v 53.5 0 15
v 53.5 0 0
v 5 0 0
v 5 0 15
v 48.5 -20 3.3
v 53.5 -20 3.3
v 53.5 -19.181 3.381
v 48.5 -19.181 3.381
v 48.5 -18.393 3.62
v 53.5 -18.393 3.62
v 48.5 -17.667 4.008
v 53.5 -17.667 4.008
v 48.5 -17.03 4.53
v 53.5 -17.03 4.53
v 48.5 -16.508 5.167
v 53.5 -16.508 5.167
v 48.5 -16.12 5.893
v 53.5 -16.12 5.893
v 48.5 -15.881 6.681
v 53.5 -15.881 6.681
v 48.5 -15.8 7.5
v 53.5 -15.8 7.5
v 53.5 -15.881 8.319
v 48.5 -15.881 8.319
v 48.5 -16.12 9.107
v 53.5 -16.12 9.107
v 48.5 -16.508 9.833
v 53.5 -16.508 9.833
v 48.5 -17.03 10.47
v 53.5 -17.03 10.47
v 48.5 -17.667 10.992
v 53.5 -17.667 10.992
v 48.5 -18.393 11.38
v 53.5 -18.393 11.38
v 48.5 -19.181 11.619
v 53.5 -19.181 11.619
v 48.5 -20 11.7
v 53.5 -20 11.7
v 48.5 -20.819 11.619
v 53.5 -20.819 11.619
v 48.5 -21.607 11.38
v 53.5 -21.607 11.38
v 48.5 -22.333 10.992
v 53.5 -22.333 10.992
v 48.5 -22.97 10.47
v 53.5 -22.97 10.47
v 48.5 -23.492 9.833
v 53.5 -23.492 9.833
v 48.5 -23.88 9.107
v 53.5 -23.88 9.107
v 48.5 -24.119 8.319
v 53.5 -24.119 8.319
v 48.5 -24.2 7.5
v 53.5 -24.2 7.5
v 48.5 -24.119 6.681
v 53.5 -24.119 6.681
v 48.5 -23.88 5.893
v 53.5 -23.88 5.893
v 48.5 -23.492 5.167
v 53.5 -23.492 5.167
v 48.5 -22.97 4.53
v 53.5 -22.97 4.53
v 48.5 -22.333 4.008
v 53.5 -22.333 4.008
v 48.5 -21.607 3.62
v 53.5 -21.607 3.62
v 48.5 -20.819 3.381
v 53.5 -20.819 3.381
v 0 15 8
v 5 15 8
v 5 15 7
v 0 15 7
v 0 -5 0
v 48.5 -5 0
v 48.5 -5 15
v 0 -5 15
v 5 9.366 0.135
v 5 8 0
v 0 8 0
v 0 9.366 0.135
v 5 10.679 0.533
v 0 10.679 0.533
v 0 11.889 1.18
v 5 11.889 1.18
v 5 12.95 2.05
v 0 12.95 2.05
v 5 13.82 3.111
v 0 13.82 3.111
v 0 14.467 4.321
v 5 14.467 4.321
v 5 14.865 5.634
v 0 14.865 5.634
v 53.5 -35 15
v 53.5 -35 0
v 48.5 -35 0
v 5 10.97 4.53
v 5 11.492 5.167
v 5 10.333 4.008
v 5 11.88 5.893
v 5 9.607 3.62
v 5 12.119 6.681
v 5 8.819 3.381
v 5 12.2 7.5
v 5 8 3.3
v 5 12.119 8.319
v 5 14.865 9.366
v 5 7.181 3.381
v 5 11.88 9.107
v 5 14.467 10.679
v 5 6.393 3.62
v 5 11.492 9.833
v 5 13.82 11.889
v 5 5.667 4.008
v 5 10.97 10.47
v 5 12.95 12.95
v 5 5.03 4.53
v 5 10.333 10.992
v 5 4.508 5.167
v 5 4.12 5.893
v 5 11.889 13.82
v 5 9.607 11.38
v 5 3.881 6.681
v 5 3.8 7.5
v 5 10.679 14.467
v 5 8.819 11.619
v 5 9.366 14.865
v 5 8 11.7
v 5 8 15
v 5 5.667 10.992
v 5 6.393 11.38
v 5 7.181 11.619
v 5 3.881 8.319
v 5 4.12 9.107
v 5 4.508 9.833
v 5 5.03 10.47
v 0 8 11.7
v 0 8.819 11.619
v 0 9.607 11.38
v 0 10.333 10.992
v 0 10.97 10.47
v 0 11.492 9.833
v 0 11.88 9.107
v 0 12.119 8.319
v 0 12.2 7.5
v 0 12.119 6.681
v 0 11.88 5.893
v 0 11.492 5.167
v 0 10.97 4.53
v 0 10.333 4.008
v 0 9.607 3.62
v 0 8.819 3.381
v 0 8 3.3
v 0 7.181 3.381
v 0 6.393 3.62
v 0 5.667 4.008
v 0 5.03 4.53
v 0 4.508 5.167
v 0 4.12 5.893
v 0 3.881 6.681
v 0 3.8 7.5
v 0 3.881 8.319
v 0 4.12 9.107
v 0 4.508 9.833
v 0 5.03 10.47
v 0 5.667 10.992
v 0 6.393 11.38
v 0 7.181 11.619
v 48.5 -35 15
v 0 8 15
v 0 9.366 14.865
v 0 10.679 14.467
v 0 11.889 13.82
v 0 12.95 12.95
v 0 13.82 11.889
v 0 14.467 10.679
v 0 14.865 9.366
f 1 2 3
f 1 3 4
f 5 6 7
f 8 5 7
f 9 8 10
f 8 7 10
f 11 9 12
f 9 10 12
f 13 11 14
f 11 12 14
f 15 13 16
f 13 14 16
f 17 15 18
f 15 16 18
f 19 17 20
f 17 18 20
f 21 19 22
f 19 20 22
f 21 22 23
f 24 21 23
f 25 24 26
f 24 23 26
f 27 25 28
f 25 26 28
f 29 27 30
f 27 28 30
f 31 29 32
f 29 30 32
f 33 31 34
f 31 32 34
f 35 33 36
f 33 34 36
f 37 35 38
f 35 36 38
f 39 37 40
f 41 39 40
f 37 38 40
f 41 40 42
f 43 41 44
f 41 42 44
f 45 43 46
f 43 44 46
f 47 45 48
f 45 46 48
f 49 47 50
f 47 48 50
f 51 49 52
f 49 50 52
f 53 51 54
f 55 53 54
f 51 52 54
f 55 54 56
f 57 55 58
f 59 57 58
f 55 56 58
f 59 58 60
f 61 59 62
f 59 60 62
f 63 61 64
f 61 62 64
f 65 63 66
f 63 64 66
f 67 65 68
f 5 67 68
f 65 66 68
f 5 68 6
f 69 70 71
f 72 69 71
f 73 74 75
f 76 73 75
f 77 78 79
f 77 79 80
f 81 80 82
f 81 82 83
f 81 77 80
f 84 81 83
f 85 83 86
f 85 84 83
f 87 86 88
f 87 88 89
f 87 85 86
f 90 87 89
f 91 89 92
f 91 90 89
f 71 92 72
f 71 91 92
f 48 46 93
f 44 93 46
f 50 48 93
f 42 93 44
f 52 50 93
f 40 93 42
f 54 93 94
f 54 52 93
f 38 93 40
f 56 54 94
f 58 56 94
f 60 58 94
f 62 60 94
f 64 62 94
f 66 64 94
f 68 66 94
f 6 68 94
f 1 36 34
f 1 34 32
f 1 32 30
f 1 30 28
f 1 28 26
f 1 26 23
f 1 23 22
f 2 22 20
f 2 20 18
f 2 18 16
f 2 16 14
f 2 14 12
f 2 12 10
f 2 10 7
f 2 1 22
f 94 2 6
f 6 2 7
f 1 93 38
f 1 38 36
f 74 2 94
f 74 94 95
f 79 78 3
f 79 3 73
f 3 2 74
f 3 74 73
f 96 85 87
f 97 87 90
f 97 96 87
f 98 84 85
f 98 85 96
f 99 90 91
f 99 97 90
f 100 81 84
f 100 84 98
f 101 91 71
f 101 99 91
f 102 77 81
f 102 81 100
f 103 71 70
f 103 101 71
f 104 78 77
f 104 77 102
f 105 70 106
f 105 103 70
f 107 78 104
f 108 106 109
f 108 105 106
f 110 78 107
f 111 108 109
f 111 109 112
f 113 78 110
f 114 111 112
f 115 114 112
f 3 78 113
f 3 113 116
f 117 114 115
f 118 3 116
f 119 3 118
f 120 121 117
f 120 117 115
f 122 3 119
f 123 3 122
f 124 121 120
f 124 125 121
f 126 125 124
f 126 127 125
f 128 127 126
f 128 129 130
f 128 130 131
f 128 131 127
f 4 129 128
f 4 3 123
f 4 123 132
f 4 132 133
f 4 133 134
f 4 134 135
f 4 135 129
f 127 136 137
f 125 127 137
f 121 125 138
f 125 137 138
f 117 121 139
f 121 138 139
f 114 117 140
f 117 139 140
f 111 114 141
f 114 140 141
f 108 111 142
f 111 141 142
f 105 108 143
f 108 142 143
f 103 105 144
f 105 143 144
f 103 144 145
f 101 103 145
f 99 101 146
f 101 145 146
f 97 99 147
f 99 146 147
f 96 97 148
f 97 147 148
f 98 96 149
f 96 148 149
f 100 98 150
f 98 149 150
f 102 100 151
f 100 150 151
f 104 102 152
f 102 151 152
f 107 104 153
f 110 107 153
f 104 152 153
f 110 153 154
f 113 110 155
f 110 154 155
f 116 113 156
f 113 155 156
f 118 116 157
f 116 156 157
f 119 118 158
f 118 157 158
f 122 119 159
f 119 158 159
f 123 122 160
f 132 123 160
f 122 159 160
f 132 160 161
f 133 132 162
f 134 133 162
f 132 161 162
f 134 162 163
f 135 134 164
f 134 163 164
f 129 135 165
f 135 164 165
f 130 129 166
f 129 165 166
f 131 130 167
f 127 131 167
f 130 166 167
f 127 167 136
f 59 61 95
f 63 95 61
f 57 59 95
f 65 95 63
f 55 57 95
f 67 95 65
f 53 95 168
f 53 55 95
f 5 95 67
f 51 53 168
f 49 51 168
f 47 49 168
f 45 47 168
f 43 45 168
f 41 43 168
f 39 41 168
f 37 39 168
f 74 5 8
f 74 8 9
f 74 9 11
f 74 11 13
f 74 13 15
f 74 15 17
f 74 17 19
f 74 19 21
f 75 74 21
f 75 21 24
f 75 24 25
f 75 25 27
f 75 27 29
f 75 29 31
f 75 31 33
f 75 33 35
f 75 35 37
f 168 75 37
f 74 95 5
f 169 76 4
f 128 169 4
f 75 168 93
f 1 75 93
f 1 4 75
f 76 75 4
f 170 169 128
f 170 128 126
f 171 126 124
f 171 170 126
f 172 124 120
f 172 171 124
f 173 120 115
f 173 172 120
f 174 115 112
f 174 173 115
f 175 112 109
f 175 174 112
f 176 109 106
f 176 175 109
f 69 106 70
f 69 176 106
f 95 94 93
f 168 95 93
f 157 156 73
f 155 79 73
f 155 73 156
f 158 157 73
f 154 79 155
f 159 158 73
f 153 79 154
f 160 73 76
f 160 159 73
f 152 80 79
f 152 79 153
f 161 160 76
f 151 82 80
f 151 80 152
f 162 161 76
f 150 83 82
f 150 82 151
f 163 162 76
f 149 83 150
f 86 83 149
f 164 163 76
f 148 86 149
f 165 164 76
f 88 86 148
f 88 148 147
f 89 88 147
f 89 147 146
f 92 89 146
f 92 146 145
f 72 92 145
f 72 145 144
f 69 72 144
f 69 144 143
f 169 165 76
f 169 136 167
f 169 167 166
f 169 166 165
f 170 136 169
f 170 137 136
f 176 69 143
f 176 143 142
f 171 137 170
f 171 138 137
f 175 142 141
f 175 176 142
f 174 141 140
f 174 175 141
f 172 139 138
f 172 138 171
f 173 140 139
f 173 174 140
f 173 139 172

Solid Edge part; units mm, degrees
sketch "Sketch1" plane through (0, 0, 0) normal (0, -1, 0) x (1, 0, 0)
  line L0 (53.5, 0) -> (0, 0)
  line L1 (0, 0) -> (0, 15)
  line L2 (0, 15) -> (53.5, 15)
  line L3 (53.5, 15) -> (53.5, 0)
extrude "Protrusion1" add sketch "Sketch1" along normal blind 5
sketch "Sketch2" plane through (18.75, -5, 7.5) normal (0, -1, 0) x (1, 0, 0)
  line L0 (29.75, -7.5) -> (29.75, 7.5)
  line L1 (29.75, 7.5) -> (34.75, 7.5)
  line L2 (34.75, 7.5) -> (34.75, -7.5)
  line L3 (34.75, -7.5) -> (29.75, -7.5)
extrude "ExtrudedProtrusion_2" add sketch "Sketch2" along normal blind 30
sketch "Sketch3" plane through (18.75, 0, 7.5) normal (0, 1, 0) x (-1, 0, 0)
  line L0 (13.75, -7.5) -> (13.75, 7.5)
  line L1 (13.75, 7.5) -> (18.75, 7.5)
  line L2 (18.75, 7.5) -> (18.75, -7.5)
  line L3 (18.75, -7.5) -> (13.75, -7.5)
extrude "ExtrudedProtrusion_3" add sketch "Sketch3" along normal blind 15
sketch "Sketch4" plane through (53.5, -17.5, 7.5) normal (1, 0, 0) x (0, 1, 0)
  circle A0 centre (-2.5, 0) radius 4
extrude "Cutout1" cut sketch "Sketch4" against normal through all
sketch "Sketch5" plane through (0, 5, 7.5) normal (-1, 0, 0) x (0, -1, 0)
  circle A0 centre (-3, 0) radius 4
extrude "Cutout2" cut sketch "Sketch5" against normal through all
fillet "Round1" radius 7 2 edges at (2.5, 15, 15) (2.5, 15, 0)
hole "Hole_1" at (0, 8, 7.5) direction (1, 0, 0) diameter 8.4 end up to next
hole "Hole_2" at (53.5, -20, 7.5) direction (-1, 0, 0) diameter 8.4 end up to next
